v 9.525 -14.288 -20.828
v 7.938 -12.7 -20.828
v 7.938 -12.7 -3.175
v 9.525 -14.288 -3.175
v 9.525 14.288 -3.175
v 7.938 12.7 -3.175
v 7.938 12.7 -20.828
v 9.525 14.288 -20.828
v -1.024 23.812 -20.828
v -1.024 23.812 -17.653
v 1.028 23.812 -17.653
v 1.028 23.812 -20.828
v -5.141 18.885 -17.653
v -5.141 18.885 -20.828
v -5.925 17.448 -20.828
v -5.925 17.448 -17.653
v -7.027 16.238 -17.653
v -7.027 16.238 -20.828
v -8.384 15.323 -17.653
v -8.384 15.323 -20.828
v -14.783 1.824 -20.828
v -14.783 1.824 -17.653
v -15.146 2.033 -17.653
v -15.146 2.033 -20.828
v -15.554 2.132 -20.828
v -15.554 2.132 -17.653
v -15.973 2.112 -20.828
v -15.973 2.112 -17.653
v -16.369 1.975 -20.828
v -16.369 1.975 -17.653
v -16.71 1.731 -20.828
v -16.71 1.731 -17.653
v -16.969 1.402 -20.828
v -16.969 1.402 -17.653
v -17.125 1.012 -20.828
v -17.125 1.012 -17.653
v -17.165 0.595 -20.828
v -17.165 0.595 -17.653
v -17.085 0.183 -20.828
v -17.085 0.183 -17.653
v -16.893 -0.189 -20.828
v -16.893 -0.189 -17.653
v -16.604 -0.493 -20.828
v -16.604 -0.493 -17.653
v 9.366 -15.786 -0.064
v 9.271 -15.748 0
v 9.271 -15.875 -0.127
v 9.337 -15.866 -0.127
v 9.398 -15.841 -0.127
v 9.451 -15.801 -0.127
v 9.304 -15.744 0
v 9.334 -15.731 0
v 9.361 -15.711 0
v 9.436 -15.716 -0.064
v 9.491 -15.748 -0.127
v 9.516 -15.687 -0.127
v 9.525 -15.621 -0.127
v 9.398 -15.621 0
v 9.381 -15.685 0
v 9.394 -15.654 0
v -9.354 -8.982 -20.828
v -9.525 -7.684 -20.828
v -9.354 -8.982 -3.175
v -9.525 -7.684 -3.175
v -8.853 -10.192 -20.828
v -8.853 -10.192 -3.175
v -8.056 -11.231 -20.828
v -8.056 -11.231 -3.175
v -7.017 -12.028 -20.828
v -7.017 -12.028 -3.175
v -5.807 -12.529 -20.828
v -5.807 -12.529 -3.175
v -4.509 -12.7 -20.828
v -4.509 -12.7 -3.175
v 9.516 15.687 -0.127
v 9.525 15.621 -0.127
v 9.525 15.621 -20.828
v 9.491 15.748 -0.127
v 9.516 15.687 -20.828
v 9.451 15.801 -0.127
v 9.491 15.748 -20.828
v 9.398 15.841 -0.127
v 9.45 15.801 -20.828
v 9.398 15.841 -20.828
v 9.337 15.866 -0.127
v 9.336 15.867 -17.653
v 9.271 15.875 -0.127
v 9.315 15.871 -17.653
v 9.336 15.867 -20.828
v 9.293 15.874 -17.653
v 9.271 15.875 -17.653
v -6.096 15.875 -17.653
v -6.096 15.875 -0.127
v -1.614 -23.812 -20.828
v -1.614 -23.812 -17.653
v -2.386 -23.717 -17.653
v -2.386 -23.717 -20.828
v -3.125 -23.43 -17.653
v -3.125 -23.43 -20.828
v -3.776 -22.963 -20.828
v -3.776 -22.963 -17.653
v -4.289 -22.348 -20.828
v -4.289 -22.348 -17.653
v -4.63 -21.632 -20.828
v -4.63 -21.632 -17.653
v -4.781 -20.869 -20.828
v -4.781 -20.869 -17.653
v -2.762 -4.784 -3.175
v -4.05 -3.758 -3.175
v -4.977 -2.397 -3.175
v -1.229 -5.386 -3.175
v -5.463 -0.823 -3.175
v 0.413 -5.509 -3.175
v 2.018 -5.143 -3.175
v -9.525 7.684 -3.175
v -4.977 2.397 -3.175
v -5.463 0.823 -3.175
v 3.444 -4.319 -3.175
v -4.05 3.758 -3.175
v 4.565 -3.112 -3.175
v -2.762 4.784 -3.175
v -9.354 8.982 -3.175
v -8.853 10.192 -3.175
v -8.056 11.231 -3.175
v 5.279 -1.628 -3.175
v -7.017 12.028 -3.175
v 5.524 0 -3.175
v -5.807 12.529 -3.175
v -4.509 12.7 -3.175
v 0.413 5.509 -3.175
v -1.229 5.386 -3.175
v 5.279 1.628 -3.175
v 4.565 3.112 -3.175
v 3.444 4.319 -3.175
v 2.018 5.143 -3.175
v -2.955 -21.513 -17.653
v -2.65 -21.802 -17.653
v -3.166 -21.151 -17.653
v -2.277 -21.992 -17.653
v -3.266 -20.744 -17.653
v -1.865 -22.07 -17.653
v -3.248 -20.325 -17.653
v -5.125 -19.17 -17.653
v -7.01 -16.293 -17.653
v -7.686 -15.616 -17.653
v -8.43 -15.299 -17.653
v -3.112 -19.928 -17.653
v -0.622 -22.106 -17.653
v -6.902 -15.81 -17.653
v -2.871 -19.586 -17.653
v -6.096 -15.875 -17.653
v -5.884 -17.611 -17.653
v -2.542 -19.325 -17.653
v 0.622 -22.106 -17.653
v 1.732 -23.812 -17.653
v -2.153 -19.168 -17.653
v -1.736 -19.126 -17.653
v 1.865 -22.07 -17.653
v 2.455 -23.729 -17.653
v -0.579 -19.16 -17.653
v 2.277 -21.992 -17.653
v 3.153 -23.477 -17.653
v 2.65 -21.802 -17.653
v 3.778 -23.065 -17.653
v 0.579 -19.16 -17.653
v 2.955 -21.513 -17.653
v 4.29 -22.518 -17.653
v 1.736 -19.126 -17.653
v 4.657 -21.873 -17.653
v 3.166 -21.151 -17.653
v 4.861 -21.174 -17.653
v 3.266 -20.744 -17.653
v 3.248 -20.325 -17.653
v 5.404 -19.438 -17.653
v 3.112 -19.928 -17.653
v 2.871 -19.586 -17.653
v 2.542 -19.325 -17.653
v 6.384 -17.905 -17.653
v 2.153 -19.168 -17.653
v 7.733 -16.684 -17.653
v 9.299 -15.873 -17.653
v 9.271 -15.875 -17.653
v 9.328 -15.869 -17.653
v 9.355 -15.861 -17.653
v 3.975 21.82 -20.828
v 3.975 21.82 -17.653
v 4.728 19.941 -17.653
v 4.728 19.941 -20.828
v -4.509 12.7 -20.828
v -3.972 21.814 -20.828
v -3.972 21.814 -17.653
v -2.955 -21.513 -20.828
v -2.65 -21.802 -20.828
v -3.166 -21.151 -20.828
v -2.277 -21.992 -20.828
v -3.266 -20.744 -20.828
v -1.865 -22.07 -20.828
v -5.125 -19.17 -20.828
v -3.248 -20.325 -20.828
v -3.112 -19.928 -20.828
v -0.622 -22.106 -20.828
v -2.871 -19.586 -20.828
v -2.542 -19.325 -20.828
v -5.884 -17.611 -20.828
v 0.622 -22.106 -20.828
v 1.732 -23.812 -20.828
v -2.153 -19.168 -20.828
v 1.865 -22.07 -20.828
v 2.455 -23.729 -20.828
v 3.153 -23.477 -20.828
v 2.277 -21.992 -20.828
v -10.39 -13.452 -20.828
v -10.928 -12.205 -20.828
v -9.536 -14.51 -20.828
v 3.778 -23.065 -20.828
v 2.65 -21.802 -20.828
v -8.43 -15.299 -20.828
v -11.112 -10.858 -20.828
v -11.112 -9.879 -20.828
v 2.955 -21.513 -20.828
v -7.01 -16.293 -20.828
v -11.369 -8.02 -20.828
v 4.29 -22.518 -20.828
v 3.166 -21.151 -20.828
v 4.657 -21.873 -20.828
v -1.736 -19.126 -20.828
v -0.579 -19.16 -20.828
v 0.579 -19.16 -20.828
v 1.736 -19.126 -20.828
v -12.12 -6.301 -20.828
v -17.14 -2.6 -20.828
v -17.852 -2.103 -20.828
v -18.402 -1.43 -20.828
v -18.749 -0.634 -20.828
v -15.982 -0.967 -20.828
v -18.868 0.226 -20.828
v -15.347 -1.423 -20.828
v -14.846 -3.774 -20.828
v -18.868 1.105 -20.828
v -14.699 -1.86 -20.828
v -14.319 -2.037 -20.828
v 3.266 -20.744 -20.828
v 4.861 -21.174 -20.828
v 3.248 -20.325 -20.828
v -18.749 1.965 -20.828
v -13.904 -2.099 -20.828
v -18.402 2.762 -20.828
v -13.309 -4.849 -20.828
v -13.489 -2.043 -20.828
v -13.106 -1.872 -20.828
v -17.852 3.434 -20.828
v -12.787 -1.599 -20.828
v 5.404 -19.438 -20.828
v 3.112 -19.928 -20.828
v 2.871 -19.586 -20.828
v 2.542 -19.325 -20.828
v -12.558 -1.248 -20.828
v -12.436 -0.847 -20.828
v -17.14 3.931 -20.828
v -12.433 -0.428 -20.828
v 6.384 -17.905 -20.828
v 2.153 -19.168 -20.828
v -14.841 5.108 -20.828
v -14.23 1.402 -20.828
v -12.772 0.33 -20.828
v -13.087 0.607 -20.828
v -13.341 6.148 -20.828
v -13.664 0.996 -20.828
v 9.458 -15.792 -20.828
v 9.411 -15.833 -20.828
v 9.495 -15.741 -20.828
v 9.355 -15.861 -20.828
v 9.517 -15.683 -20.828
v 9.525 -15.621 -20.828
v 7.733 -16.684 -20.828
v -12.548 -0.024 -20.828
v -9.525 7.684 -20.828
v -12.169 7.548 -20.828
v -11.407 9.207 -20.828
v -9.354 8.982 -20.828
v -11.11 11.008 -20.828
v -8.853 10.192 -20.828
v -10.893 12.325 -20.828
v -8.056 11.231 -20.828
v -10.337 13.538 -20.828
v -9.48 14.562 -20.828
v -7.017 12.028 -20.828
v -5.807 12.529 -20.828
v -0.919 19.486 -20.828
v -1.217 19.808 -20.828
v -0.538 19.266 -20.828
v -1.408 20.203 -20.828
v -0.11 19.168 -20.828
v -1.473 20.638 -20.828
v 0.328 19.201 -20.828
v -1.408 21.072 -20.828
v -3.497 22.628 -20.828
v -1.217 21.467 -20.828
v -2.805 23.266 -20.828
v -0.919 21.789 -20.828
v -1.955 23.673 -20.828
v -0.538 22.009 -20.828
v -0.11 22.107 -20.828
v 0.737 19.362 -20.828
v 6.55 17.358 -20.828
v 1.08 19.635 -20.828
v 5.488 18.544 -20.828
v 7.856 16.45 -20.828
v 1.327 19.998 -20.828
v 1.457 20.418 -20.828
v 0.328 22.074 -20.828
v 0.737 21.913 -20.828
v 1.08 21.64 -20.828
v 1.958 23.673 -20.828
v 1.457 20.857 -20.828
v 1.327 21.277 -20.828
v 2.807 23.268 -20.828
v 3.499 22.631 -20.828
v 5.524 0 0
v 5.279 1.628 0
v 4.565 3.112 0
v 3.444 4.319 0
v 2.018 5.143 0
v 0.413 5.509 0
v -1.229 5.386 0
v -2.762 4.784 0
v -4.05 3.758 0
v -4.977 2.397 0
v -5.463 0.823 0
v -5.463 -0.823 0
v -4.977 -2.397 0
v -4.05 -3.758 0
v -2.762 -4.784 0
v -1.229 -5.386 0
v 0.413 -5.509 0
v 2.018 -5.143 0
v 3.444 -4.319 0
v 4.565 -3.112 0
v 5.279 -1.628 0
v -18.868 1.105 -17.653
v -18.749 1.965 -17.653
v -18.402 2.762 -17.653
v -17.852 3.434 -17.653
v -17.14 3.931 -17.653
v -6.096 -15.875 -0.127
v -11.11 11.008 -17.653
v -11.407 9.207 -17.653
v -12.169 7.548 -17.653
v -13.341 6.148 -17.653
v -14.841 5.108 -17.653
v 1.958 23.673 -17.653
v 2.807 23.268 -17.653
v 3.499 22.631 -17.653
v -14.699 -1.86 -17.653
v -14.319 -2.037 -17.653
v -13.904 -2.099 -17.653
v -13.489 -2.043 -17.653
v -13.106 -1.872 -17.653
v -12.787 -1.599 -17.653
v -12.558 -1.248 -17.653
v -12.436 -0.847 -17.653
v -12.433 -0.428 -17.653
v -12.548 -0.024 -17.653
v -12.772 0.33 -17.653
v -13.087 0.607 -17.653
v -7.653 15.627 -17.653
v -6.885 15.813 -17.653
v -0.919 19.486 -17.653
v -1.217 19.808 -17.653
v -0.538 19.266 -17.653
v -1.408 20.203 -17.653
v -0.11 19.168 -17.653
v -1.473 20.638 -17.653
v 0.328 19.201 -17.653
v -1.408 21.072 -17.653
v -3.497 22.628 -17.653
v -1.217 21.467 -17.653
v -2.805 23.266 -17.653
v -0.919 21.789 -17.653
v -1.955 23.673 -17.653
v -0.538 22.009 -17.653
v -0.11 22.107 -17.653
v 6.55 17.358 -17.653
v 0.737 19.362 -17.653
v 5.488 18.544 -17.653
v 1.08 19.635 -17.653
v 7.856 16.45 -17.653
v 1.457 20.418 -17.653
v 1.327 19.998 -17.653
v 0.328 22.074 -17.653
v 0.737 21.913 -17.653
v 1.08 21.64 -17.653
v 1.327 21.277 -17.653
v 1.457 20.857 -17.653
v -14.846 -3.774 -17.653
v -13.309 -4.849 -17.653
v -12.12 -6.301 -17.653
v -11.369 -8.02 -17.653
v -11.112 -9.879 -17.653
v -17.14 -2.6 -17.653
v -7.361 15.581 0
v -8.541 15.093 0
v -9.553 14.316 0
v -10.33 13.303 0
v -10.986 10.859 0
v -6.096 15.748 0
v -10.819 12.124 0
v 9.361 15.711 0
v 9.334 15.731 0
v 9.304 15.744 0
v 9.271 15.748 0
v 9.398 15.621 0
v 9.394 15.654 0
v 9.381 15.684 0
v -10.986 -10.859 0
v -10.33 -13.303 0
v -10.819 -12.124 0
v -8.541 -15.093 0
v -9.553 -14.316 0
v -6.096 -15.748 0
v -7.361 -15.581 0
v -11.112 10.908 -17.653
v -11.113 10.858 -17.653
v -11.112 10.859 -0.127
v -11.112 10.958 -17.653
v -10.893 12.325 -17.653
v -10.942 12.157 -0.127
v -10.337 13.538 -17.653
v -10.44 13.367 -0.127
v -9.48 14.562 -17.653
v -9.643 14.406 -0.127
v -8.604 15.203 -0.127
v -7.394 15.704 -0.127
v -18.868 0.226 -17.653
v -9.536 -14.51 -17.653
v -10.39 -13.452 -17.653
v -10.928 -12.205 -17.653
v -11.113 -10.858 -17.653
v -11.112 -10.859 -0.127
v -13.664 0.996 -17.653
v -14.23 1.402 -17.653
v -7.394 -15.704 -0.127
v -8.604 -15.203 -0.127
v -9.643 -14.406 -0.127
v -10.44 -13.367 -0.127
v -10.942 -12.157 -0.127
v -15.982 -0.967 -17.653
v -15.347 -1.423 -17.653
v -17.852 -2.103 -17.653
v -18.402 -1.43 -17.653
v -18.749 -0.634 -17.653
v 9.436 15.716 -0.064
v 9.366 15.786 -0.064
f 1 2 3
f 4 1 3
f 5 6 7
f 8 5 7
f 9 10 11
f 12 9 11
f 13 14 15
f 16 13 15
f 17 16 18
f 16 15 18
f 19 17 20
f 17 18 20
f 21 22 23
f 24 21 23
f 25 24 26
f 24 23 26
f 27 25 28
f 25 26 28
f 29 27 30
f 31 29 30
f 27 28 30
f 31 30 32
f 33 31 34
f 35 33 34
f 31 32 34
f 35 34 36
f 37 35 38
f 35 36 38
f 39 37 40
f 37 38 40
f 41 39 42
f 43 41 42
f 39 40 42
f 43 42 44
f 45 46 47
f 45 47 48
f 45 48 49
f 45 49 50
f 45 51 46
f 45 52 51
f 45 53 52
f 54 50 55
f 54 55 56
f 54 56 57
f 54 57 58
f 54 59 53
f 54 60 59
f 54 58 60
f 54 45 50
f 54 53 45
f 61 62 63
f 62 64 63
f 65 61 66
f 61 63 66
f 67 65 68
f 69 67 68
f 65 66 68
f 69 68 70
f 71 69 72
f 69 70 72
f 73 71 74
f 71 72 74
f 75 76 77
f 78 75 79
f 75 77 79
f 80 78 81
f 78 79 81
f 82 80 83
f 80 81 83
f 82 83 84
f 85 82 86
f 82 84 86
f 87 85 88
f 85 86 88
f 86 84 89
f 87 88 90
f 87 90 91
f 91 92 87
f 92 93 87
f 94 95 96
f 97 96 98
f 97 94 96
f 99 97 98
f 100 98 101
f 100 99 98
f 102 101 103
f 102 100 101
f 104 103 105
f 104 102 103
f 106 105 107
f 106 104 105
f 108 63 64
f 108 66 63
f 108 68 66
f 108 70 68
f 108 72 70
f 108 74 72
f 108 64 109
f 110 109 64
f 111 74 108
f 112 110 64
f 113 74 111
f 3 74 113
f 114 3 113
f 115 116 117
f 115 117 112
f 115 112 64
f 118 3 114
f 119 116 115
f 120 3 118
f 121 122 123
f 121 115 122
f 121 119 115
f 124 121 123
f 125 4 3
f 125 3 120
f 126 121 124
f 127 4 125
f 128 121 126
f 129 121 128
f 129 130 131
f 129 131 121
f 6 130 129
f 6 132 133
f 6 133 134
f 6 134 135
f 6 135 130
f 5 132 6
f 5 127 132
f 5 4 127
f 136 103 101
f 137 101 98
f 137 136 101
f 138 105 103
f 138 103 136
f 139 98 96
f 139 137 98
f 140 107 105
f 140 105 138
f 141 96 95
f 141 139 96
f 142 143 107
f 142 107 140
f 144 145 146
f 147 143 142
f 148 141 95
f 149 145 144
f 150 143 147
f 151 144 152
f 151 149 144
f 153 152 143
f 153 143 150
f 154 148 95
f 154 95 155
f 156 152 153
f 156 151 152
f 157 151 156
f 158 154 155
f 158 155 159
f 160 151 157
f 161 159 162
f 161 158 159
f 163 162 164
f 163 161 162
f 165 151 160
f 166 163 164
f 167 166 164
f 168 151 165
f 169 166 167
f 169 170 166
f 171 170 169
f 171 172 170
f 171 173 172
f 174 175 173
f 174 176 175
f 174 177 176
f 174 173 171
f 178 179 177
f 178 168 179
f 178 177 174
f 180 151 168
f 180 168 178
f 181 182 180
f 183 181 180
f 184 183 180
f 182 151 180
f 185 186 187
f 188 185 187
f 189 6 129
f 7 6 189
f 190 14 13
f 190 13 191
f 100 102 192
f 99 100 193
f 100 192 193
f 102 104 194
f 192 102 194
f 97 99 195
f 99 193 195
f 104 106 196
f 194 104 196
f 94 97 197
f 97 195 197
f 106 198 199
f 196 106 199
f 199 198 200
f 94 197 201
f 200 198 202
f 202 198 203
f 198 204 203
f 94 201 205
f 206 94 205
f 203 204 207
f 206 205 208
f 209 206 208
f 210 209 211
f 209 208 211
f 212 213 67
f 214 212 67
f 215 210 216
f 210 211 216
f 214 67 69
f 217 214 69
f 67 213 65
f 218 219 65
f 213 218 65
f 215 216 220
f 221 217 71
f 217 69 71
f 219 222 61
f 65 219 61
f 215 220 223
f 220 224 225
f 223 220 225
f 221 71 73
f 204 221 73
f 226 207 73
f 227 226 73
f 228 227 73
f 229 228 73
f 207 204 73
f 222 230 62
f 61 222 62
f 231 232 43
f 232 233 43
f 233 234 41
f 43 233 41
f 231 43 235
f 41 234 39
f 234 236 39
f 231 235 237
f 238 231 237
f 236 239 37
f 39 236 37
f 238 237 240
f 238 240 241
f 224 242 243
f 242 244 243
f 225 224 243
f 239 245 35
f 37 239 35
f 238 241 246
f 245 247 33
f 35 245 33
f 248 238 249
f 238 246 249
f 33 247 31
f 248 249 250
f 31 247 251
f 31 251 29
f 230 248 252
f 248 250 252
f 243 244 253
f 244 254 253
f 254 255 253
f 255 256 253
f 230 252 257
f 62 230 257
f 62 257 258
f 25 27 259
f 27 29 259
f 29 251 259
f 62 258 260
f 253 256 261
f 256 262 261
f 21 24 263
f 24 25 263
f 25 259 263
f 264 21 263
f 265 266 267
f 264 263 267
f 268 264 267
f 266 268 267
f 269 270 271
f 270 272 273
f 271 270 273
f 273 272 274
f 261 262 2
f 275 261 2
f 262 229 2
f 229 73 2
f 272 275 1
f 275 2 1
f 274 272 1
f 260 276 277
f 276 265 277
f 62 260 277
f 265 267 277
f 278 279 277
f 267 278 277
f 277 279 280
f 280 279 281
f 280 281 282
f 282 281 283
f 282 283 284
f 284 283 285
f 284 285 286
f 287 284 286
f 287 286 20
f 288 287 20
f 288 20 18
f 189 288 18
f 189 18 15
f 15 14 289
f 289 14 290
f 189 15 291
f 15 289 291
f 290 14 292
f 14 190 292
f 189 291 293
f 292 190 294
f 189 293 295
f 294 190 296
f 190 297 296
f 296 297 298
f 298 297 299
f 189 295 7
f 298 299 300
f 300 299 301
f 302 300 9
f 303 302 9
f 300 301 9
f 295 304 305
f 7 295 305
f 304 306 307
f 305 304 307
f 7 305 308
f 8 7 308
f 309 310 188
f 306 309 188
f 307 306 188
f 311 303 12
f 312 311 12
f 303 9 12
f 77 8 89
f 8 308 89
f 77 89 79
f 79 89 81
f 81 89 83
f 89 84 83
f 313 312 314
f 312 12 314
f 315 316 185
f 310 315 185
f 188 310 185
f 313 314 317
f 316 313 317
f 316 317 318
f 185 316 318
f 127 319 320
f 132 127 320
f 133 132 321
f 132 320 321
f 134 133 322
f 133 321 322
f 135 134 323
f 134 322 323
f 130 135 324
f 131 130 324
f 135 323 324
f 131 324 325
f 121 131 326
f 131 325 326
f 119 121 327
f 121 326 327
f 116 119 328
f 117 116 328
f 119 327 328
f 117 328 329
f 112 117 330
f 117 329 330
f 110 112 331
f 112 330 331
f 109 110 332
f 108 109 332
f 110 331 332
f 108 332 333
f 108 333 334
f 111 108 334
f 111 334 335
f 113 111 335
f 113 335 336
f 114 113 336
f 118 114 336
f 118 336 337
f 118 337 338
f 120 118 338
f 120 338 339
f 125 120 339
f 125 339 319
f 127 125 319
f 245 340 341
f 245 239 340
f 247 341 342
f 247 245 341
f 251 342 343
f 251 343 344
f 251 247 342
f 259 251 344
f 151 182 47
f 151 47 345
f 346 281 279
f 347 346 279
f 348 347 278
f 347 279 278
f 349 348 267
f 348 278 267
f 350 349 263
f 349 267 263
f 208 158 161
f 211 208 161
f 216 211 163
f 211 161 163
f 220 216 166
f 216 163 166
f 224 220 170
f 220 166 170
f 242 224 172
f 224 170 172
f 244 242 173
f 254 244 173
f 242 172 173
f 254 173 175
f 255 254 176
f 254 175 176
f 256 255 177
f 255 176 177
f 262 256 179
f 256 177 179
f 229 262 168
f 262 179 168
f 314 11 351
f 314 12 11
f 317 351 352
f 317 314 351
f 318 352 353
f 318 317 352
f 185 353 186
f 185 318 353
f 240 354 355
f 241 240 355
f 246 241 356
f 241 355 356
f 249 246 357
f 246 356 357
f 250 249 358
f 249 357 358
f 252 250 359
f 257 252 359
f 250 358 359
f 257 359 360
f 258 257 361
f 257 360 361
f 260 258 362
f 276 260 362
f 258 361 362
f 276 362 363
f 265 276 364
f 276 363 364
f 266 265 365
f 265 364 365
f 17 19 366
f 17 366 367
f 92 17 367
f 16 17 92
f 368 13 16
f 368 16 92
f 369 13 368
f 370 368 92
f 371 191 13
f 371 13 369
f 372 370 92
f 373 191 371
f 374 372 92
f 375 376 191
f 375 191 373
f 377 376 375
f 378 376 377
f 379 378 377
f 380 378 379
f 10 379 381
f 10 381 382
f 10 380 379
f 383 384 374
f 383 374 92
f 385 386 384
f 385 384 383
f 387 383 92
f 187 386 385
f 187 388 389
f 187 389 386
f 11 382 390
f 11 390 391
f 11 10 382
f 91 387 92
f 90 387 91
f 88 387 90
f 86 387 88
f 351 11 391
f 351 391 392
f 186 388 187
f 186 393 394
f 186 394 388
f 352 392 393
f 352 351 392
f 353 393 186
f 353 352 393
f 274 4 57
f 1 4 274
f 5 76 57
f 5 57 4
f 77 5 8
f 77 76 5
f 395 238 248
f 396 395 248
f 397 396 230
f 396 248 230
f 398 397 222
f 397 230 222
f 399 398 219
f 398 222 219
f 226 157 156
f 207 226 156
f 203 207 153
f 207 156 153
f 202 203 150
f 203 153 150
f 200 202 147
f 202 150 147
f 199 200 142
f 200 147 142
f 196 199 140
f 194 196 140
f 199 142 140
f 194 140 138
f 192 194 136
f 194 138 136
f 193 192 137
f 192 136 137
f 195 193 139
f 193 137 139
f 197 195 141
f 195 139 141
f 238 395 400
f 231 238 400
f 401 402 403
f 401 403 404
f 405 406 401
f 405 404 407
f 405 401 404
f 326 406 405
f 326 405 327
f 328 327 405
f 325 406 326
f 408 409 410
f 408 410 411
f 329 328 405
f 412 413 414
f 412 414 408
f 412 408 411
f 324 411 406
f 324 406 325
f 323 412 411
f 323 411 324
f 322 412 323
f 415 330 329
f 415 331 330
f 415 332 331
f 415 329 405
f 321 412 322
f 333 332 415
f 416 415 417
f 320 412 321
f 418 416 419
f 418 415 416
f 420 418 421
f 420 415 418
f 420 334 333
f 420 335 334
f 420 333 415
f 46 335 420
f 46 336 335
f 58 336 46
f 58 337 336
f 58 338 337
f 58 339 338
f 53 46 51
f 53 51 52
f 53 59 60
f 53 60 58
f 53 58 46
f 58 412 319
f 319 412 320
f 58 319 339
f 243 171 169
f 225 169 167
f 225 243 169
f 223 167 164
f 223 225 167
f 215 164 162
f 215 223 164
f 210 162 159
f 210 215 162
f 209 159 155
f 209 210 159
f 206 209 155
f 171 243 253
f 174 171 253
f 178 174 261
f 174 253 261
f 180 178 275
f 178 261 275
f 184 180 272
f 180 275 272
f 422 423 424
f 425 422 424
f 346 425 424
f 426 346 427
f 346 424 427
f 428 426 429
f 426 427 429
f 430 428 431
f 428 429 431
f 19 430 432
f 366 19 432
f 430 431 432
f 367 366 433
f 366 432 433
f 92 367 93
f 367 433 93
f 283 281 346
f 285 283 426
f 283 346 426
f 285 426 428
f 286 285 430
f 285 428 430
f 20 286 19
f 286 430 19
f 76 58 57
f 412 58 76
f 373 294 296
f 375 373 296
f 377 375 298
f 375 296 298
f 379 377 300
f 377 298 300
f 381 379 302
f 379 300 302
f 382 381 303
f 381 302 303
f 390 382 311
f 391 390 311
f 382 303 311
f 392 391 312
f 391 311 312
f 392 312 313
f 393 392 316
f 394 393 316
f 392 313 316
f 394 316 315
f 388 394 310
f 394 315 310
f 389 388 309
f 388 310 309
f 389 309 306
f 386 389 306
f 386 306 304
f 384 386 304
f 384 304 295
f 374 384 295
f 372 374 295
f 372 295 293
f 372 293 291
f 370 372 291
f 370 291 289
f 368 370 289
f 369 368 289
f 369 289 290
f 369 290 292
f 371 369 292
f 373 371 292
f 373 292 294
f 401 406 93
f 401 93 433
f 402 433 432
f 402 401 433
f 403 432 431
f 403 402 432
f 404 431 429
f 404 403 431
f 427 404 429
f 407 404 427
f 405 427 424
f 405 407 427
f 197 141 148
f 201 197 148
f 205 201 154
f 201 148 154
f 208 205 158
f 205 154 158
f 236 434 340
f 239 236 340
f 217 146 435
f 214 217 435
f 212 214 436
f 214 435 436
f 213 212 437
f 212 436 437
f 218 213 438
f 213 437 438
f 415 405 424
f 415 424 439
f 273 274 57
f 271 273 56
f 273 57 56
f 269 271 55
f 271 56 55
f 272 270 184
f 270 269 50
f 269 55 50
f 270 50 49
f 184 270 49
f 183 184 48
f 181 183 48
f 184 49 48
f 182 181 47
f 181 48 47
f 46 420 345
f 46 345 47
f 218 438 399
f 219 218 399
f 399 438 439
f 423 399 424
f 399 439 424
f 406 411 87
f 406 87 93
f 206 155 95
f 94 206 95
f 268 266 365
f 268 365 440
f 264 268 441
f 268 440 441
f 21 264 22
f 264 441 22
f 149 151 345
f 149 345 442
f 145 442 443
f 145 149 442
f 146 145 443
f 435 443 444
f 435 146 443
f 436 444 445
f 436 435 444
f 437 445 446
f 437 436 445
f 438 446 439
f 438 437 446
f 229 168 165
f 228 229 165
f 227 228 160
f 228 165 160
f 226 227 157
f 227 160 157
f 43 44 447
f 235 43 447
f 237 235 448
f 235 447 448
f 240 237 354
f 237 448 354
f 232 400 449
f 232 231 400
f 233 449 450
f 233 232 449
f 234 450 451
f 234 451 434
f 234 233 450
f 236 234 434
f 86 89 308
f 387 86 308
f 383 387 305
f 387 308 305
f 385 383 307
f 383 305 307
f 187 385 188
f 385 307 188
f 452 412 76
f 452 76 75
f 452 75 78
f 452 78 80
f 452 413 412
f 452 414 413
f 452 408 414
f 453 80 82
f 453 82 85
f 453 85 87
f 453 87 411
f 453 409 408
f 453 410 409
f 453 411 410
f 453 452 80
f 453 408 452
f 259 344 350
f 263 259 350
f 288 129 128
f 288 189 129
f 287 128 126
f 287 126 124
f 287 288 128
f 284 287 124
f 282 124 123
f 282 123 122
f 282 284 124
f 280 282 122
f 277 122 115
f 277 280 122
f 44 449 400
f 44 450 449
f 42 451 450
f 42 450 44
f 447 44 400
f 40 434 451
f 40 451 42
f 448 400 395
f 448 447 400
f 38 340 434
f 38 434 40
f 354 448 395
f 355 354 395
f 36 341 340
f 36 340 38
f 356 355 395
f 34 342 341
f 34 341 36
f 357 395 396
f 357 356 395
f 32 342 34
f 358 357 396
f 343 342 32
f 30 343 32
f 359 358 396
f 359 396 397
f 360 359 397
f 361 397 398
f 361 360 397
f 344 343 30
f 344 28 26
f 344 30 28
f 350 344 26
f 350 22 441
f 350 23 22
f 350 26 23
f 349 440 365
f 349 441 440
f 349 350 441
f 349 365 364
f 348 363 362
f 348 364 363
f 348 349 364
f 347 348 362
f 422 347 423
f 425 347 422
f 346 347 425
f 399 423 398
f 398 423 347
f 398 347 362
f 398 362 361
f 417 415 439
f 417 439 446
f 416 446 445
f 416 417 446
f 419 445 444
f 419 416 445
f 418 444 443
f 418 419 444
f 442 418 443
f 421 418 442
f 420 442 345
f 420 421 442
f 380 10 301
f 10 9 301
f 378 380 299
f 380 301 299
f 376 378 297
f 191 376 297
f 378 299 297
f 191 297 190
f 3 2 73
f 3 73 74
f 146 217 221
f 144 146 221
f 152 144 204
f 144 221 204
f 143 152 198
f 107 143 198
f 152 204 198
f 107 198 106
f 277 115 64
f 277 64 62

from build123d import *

# Parameters (mm, degrees)
BOSS_EXTRUDE1_DEPTH   = 9.525
SKETCH2_R             = 5.5245
CUT_EXTRUDE1_DEPTH    = 35.200748661
SKETCH11_W            = 17.653
SKETCH11_H            = 9.525
CUT_EXTRUDE4_DEPTH    = 38.971938112
F_4_CLEARANCE_HOLE1_D = 2.9464
CUT_EXTRUDE5_DEPTH    = 33.365321472
BOSS_EXTRUDE2_DEPTH   = 1.5875
SKETCH16_W            = 9.525
SKETCH16_H            = 50.8
BOSS_EXTRUDE3_DEPTH   = 3.175
FILLET1_R             = 5.0165
CUT_EXTRUDE6_DEPTH    = 38.184604546
FILLET3_R             = 0.254
CHAMFER1_SIZE         = 0.127
CHAMFER2_SIZE         = 1.5875
SKETCH18_OUTSIDE_W    = 44.691
SKETCH18_OUTSIDE_H    = 65.328
CUT_EXTRUDE7_DEPTH    = 38.184604546
FILLET5_START         = -20.828
FILLET5_DEPTH         = 3.175
FILLET6_R             = 3.175


with BuildPart() as part:
    # Sketch1 → Boss-Extrude1 (new, symmetric)
    with BuildSketch(Plane(origin=(0, 0, 0), x_dir=(0, 0, -1), z_dir=(1, 0, 0))):
        Polygon((0, 25.4), (0, -25.4), (20.828, -25.4), (20.828, -12.7), (3.175, -12.7), (3.175, 12.7), (20.828, 12.7), (20.828, 25.4), align=None)
    extrude(amount=BOSS_EXTRUDE1_DEPTH, both=True)

    # Sketch2 → Cut-Extrude1 (cut, through all)
    with BuildSketch(Plane.XY):
        Circle(SKETCH2_R)
    extrude(amount=-CUT_EXTRUDE1_DEPTH, mode=Mode.SUBTRACT)

    # Sketch11 → Cut-Extrude4 (cut, through all)
    with BuildSketch(Plane(origin=(9.525, 0, 0), x_dir=(0, 0, -1), z_dir=(1, 0, 0))):
        with Locations((8.8265, 20.6375)):
            Rectangle(SKETCH11_W, SKETCH11_H)
    cut_extrude4 = extrude(amount=-CUT_EXTRUDE4_DEPTH, mode=Mode.SUBTRACT)

    # #4 Clearance Hole1 (through all)
    with Locations(Plane.XY.offset(-17.653)):
        with Locations((0, 20.6375)):
            Hole(F_4_CLEARANCE_HOLE1_D / 2)

    # Mirror1: Cut-Extrude4 across plane
    add(cut_extrude4.mirror(Plane.ZX), mode=Mode.SUBTRACT)

    # Sketch14 → Cut-Extrude5 (cut, through all)
    with BuildSketch(Plane.XY.offset(-17.653)):
        with BuildLine():
            ThreePointArc((-1.864650295, -22.070013186), (0, -22.1107), (1.864650295, -22.070013186))
            ThreePointArc((1.864650295, -22.070013186), (3.272188054, -20.533955264), (1.736130132, -19.126417506))
            ThreePointArc((1.736130132, -19.126417506), (0, -19.1643), (-1.736130132, -19.126417506))
            ThreePointArc((-1.736130132, -19.126417506), (-3.272188054, -20.533955264), (-1.864650295, -22.070013186))
        make_face()
    extrude(amount=-CUT_EXTRUDE5_DEPTH, mode=Mode.SUBTRACT)

    # Sketch15 → Boss-Extrude2 (add)
    with BuildSketch(Plane.ZY.offset(9.525)):
        Polygon((-20.828, 12.7), (-20.828, 25.4), (-17.653, 25.4), (-17.653, 15.875), (0, 15.875), (0, -15.875), (-17.653, -15.875), (-17.653, -25.4), (-20.828, -25.4), (-20.828, -12.7), align=None)
    extrude(amount=BOSS_EXTRUDE2_DEPTH)

    # Sketch16 → Boss-Extrude3 (add)
    with BuildSketch(Plane.XY.offset(-17.653)):
        with Locations((-15.875, 0)):
            Rectangle(SKETCH16_W, SKETCH16_H)
    extrude(amount=-BOSS_EXTRUDE3_DEPTH)

    # Fillet1
    fillet1_edges = [part.edges().sort_by_distance(p)[0] for p in [
        (-9.525, 12.7, -12.0015),
        (-11.1125, -15.875, -8.8265),
        (-11.1125, 15.875, -8.8265),
        (-9.525, -12.7, -12.0015),
    ]]
    fillet(fillet1_edges, radius=FILLET1_R)

    # Sketch17 → Cut-Extrude6 (cut, through all)
    with BuildSketch(Plane.XY.offset(-17.653)):
        with BuildLine():
            ThreePointArc((-16.603528504, -0.49285067), (-15.666032673, -1.196975), (-14.698715658, -1.859536166))
            ThreePointArc((-14.698715658, -1.859536166), (-12.659629074, -1.432028992), (-13.087136248, 0.607057592))
            ThreePointArc((-13.087136248, 0.607057592), (-13.94839582, 1.196975), (-14.783103829, 1.823898553))
            ThreePointArc((-14.783103829, 1.823898553), (-16.851690778, 1.575736279), (-16.603528504, -0.49285067))
        make_face()
    extrude(amount=-CUT_EXTRUDE6_DEPTH, mode=Mode.SUBTRACT)

    # Fillet3
    fillet3_edges = [part.edges().sort_by_distance(p)[0] for p in [
        (9.525, 15.875, -8.8265),
        (9.525, -15.875, -8.8265),
    ]]
    fillet(fillet3_edges, radius=FILLET3_R)

    # Chamfer1
    chamfer1_edges = [part.edges().sort_by_distance(p)[0] for p in [
        (-11.1125, 0, 0),
        (1.5875, 15.875, 0),
        (1.5875, -15.875, 0),
        (-9.643201168, -14.405701168, 0),
        (-9.643201168, 14.405701168, 0),
        (9.525, 0, 0),
        (9.450605122, -15.800605122, 0),
        (9.450605122, 15.800605122, 0),
    ]]
    chamfer(chamfer1_edges, length=CHAMFER1_SIZE)

    # Chamfer2
    chamfer2_edges = [part.edges().sort_by_distance(p)[0] for p in [
        (9.525, -12.7, -12.0015),
        (9.525, 12.7, -12.0015),
    ]]
    chamfer(chamfer2_edges, length=CHAMFER2_SIZE)

    # Sketch18 outside → Cut-Extrude7 (cut, through all)
    with BuildSketch(Plane.XY.offset(-17.653)):
        with Locations((-5.5565, 0)):
            Rectangle(SKETCH18_OUTSIDE_W, SKETCH18_OUTSIDE_H)
        with BuildLine():
            Line((9.525, 15.621), (9.525, -15.621))
            ThreePointArc((9.525, -15.621), (9.450605122, -15.800605122), (9.271, -15.875))
            Line((9.271, -15.875), (4.7625, -15.875))
            Line((4.7625, -15.875), (4.7625, -23.8125))
            Line((4.7625, -23.8125), (-4.7625, -23.8125))
            Line((-4.7625, -23.8125), (-4.7625, -15.875))
            Line((-4.7625, -15.875), (-6.096, -15.875))
            ThreePointArc((-6.096, -15.875), (-9.643201168, -14.405701168), (-11.1125, -10.8585))
            Line((-11.1125, -10.8585), (-11.1125, -5.684476059))
            Line((-11.1125, -5.684476059), (-18.868316167, -1.715726059))
            Line((-18.868316167, -1.715726059), (-18.868316167, 3.046773941))
            Line((-18.868316167, 3.046773941), (-11.1125, 7.015523941))
            Line((-11.1125, 7.015523941), (-11.1125, 10.8585))
            ThreePointArc((-11.1125, 10.8585), (-9.730137534, 14.316579906), (-6.344906405, 15.868821133))
            Line((-6.344906405, 15.868821133), (-3.175, 23.8125))
            Line((-3.175, 23.8125), (3.175, 23.8125))
            Line((3.175, 23.8125), (6.360346812, 15.875))
            Line((6.360346812, 15.875), (9.271, 15.875))
            ThreePointArc((9.271, 15.875), (9.450605122, 15.800605122), (9.525, 15.621))
        make_face(mode=Mode.SUBTRACT)
    extrude(amount=-CUT_EXTRUDE7_DEPTH, mode=Mode.SUBTRACT)

    # Fillet5: read off the stored shape, not the designer's step
    # Fillet5 outline → Fillet5 (add)
    with BuildSketch(Plane.XY.offset(FILLET5_START)):
        with BuildLine():
            Line((-6.344906405, 15.868821133), (-5.141439076, 18.884669795))
            ThreePointArc((-5.141439076, 18.884669795), (-6.439586705, 16.809867774), (-8.383629538, 15.323029465))
            ThreePointArc((-8.383629538, 15.323029465), (-7.393295565, 15.704353533), (-6.344906405, 15.868821133))
        make_face()
        with BuildLine():
            Line((4.728452297, 19.941484272), (6.360346812, 15.875))
            Line((6.360346812, 15.875), (9.271, 15.875))
            ThreePointArc((9.271, 15.875), (9.303812086, 15.872871727), (9.336074306, 15.866522574))
            ThreePointArc((9.336074306, 15.866522574), (6.549781647, 17.358453978), (4.728452297, 19.941484272))
        make_face()
        with BuildLine():
            Line((9.271, -15.875), (4.7625, -15.875))
            Line((4.7625, -15.875), (4.7625, -22.333703908))
            ThreePointArc((4.7625, -22.333703908), (6.027219419, -18.365407505), (9.354910714, -15.860739425))
            ThreePointArc((9.354910714, -15.860739425), (9.313556938, -15.871409478), (9.271, -15.875))
        make_face()
        with BuildLine():
            ThreePointArc((-6.096, -15.875), (-7.297950449, -15.728878565), (-8.429879679, -15.299026759))
            ThreePointArc((-8.429879679, -15.299026759), (-5.750515411, -17.823432924), (-4.7625, -21.369620302))
            Line((-4.7625, -21.369620302), (-4.7625, -15.875))
            Line((-4.7625, -15.875), (-6.096, -15.875))
        make_face()
        with BuildLine():
            Line((-11.1125, -9.878885048), (-11.1125, -5.684476059))
            Line((-11.1125, -5.684476059), (-14.846436435, -3.773773186))
            ThreePointArc((-14.846436435, -3.773773186), (-12.119987547, -6.300663697), (-11.1125, -9.878885048))
        make_face()
        with BuildLine():
            ThreePointArc((-11.1125, 10.8585), (-11.11194212, 10.933312395), (-11.110268606, 11.008108151))
            ThreePointArc((-11.110268606, 11.008108151), (-12.168719233, 7.547562085), (-14.841154527, 5.107523888))
            Line((-14.841154527, 5.107523888), (-11.1125, 7.015523941))
            Line((-11.1125, 7.015523941), (-11.1125, 10.8585))
        make_face()
    extrude(amount=FILLET5_DEPTH)

    # Fillet6
    fillet6_edges = [part.edges().sort_by_distance(p)[0] for p in [
        (-3.175, 23.8125, -19.2405),
        (3.175, 23.8125, -19.2405),
        (4.7625, -23.8125, -19.2405),
        (-4.7625, -23.8125, -19.2405),
        (-18.868316167, 3.046773941, -19.2405),
        (-18.868316167, -1.715726059, -19.2405),
    ]]
    fillet(fillet6_edges, radius=FILLET6_R)


solid = part.part
